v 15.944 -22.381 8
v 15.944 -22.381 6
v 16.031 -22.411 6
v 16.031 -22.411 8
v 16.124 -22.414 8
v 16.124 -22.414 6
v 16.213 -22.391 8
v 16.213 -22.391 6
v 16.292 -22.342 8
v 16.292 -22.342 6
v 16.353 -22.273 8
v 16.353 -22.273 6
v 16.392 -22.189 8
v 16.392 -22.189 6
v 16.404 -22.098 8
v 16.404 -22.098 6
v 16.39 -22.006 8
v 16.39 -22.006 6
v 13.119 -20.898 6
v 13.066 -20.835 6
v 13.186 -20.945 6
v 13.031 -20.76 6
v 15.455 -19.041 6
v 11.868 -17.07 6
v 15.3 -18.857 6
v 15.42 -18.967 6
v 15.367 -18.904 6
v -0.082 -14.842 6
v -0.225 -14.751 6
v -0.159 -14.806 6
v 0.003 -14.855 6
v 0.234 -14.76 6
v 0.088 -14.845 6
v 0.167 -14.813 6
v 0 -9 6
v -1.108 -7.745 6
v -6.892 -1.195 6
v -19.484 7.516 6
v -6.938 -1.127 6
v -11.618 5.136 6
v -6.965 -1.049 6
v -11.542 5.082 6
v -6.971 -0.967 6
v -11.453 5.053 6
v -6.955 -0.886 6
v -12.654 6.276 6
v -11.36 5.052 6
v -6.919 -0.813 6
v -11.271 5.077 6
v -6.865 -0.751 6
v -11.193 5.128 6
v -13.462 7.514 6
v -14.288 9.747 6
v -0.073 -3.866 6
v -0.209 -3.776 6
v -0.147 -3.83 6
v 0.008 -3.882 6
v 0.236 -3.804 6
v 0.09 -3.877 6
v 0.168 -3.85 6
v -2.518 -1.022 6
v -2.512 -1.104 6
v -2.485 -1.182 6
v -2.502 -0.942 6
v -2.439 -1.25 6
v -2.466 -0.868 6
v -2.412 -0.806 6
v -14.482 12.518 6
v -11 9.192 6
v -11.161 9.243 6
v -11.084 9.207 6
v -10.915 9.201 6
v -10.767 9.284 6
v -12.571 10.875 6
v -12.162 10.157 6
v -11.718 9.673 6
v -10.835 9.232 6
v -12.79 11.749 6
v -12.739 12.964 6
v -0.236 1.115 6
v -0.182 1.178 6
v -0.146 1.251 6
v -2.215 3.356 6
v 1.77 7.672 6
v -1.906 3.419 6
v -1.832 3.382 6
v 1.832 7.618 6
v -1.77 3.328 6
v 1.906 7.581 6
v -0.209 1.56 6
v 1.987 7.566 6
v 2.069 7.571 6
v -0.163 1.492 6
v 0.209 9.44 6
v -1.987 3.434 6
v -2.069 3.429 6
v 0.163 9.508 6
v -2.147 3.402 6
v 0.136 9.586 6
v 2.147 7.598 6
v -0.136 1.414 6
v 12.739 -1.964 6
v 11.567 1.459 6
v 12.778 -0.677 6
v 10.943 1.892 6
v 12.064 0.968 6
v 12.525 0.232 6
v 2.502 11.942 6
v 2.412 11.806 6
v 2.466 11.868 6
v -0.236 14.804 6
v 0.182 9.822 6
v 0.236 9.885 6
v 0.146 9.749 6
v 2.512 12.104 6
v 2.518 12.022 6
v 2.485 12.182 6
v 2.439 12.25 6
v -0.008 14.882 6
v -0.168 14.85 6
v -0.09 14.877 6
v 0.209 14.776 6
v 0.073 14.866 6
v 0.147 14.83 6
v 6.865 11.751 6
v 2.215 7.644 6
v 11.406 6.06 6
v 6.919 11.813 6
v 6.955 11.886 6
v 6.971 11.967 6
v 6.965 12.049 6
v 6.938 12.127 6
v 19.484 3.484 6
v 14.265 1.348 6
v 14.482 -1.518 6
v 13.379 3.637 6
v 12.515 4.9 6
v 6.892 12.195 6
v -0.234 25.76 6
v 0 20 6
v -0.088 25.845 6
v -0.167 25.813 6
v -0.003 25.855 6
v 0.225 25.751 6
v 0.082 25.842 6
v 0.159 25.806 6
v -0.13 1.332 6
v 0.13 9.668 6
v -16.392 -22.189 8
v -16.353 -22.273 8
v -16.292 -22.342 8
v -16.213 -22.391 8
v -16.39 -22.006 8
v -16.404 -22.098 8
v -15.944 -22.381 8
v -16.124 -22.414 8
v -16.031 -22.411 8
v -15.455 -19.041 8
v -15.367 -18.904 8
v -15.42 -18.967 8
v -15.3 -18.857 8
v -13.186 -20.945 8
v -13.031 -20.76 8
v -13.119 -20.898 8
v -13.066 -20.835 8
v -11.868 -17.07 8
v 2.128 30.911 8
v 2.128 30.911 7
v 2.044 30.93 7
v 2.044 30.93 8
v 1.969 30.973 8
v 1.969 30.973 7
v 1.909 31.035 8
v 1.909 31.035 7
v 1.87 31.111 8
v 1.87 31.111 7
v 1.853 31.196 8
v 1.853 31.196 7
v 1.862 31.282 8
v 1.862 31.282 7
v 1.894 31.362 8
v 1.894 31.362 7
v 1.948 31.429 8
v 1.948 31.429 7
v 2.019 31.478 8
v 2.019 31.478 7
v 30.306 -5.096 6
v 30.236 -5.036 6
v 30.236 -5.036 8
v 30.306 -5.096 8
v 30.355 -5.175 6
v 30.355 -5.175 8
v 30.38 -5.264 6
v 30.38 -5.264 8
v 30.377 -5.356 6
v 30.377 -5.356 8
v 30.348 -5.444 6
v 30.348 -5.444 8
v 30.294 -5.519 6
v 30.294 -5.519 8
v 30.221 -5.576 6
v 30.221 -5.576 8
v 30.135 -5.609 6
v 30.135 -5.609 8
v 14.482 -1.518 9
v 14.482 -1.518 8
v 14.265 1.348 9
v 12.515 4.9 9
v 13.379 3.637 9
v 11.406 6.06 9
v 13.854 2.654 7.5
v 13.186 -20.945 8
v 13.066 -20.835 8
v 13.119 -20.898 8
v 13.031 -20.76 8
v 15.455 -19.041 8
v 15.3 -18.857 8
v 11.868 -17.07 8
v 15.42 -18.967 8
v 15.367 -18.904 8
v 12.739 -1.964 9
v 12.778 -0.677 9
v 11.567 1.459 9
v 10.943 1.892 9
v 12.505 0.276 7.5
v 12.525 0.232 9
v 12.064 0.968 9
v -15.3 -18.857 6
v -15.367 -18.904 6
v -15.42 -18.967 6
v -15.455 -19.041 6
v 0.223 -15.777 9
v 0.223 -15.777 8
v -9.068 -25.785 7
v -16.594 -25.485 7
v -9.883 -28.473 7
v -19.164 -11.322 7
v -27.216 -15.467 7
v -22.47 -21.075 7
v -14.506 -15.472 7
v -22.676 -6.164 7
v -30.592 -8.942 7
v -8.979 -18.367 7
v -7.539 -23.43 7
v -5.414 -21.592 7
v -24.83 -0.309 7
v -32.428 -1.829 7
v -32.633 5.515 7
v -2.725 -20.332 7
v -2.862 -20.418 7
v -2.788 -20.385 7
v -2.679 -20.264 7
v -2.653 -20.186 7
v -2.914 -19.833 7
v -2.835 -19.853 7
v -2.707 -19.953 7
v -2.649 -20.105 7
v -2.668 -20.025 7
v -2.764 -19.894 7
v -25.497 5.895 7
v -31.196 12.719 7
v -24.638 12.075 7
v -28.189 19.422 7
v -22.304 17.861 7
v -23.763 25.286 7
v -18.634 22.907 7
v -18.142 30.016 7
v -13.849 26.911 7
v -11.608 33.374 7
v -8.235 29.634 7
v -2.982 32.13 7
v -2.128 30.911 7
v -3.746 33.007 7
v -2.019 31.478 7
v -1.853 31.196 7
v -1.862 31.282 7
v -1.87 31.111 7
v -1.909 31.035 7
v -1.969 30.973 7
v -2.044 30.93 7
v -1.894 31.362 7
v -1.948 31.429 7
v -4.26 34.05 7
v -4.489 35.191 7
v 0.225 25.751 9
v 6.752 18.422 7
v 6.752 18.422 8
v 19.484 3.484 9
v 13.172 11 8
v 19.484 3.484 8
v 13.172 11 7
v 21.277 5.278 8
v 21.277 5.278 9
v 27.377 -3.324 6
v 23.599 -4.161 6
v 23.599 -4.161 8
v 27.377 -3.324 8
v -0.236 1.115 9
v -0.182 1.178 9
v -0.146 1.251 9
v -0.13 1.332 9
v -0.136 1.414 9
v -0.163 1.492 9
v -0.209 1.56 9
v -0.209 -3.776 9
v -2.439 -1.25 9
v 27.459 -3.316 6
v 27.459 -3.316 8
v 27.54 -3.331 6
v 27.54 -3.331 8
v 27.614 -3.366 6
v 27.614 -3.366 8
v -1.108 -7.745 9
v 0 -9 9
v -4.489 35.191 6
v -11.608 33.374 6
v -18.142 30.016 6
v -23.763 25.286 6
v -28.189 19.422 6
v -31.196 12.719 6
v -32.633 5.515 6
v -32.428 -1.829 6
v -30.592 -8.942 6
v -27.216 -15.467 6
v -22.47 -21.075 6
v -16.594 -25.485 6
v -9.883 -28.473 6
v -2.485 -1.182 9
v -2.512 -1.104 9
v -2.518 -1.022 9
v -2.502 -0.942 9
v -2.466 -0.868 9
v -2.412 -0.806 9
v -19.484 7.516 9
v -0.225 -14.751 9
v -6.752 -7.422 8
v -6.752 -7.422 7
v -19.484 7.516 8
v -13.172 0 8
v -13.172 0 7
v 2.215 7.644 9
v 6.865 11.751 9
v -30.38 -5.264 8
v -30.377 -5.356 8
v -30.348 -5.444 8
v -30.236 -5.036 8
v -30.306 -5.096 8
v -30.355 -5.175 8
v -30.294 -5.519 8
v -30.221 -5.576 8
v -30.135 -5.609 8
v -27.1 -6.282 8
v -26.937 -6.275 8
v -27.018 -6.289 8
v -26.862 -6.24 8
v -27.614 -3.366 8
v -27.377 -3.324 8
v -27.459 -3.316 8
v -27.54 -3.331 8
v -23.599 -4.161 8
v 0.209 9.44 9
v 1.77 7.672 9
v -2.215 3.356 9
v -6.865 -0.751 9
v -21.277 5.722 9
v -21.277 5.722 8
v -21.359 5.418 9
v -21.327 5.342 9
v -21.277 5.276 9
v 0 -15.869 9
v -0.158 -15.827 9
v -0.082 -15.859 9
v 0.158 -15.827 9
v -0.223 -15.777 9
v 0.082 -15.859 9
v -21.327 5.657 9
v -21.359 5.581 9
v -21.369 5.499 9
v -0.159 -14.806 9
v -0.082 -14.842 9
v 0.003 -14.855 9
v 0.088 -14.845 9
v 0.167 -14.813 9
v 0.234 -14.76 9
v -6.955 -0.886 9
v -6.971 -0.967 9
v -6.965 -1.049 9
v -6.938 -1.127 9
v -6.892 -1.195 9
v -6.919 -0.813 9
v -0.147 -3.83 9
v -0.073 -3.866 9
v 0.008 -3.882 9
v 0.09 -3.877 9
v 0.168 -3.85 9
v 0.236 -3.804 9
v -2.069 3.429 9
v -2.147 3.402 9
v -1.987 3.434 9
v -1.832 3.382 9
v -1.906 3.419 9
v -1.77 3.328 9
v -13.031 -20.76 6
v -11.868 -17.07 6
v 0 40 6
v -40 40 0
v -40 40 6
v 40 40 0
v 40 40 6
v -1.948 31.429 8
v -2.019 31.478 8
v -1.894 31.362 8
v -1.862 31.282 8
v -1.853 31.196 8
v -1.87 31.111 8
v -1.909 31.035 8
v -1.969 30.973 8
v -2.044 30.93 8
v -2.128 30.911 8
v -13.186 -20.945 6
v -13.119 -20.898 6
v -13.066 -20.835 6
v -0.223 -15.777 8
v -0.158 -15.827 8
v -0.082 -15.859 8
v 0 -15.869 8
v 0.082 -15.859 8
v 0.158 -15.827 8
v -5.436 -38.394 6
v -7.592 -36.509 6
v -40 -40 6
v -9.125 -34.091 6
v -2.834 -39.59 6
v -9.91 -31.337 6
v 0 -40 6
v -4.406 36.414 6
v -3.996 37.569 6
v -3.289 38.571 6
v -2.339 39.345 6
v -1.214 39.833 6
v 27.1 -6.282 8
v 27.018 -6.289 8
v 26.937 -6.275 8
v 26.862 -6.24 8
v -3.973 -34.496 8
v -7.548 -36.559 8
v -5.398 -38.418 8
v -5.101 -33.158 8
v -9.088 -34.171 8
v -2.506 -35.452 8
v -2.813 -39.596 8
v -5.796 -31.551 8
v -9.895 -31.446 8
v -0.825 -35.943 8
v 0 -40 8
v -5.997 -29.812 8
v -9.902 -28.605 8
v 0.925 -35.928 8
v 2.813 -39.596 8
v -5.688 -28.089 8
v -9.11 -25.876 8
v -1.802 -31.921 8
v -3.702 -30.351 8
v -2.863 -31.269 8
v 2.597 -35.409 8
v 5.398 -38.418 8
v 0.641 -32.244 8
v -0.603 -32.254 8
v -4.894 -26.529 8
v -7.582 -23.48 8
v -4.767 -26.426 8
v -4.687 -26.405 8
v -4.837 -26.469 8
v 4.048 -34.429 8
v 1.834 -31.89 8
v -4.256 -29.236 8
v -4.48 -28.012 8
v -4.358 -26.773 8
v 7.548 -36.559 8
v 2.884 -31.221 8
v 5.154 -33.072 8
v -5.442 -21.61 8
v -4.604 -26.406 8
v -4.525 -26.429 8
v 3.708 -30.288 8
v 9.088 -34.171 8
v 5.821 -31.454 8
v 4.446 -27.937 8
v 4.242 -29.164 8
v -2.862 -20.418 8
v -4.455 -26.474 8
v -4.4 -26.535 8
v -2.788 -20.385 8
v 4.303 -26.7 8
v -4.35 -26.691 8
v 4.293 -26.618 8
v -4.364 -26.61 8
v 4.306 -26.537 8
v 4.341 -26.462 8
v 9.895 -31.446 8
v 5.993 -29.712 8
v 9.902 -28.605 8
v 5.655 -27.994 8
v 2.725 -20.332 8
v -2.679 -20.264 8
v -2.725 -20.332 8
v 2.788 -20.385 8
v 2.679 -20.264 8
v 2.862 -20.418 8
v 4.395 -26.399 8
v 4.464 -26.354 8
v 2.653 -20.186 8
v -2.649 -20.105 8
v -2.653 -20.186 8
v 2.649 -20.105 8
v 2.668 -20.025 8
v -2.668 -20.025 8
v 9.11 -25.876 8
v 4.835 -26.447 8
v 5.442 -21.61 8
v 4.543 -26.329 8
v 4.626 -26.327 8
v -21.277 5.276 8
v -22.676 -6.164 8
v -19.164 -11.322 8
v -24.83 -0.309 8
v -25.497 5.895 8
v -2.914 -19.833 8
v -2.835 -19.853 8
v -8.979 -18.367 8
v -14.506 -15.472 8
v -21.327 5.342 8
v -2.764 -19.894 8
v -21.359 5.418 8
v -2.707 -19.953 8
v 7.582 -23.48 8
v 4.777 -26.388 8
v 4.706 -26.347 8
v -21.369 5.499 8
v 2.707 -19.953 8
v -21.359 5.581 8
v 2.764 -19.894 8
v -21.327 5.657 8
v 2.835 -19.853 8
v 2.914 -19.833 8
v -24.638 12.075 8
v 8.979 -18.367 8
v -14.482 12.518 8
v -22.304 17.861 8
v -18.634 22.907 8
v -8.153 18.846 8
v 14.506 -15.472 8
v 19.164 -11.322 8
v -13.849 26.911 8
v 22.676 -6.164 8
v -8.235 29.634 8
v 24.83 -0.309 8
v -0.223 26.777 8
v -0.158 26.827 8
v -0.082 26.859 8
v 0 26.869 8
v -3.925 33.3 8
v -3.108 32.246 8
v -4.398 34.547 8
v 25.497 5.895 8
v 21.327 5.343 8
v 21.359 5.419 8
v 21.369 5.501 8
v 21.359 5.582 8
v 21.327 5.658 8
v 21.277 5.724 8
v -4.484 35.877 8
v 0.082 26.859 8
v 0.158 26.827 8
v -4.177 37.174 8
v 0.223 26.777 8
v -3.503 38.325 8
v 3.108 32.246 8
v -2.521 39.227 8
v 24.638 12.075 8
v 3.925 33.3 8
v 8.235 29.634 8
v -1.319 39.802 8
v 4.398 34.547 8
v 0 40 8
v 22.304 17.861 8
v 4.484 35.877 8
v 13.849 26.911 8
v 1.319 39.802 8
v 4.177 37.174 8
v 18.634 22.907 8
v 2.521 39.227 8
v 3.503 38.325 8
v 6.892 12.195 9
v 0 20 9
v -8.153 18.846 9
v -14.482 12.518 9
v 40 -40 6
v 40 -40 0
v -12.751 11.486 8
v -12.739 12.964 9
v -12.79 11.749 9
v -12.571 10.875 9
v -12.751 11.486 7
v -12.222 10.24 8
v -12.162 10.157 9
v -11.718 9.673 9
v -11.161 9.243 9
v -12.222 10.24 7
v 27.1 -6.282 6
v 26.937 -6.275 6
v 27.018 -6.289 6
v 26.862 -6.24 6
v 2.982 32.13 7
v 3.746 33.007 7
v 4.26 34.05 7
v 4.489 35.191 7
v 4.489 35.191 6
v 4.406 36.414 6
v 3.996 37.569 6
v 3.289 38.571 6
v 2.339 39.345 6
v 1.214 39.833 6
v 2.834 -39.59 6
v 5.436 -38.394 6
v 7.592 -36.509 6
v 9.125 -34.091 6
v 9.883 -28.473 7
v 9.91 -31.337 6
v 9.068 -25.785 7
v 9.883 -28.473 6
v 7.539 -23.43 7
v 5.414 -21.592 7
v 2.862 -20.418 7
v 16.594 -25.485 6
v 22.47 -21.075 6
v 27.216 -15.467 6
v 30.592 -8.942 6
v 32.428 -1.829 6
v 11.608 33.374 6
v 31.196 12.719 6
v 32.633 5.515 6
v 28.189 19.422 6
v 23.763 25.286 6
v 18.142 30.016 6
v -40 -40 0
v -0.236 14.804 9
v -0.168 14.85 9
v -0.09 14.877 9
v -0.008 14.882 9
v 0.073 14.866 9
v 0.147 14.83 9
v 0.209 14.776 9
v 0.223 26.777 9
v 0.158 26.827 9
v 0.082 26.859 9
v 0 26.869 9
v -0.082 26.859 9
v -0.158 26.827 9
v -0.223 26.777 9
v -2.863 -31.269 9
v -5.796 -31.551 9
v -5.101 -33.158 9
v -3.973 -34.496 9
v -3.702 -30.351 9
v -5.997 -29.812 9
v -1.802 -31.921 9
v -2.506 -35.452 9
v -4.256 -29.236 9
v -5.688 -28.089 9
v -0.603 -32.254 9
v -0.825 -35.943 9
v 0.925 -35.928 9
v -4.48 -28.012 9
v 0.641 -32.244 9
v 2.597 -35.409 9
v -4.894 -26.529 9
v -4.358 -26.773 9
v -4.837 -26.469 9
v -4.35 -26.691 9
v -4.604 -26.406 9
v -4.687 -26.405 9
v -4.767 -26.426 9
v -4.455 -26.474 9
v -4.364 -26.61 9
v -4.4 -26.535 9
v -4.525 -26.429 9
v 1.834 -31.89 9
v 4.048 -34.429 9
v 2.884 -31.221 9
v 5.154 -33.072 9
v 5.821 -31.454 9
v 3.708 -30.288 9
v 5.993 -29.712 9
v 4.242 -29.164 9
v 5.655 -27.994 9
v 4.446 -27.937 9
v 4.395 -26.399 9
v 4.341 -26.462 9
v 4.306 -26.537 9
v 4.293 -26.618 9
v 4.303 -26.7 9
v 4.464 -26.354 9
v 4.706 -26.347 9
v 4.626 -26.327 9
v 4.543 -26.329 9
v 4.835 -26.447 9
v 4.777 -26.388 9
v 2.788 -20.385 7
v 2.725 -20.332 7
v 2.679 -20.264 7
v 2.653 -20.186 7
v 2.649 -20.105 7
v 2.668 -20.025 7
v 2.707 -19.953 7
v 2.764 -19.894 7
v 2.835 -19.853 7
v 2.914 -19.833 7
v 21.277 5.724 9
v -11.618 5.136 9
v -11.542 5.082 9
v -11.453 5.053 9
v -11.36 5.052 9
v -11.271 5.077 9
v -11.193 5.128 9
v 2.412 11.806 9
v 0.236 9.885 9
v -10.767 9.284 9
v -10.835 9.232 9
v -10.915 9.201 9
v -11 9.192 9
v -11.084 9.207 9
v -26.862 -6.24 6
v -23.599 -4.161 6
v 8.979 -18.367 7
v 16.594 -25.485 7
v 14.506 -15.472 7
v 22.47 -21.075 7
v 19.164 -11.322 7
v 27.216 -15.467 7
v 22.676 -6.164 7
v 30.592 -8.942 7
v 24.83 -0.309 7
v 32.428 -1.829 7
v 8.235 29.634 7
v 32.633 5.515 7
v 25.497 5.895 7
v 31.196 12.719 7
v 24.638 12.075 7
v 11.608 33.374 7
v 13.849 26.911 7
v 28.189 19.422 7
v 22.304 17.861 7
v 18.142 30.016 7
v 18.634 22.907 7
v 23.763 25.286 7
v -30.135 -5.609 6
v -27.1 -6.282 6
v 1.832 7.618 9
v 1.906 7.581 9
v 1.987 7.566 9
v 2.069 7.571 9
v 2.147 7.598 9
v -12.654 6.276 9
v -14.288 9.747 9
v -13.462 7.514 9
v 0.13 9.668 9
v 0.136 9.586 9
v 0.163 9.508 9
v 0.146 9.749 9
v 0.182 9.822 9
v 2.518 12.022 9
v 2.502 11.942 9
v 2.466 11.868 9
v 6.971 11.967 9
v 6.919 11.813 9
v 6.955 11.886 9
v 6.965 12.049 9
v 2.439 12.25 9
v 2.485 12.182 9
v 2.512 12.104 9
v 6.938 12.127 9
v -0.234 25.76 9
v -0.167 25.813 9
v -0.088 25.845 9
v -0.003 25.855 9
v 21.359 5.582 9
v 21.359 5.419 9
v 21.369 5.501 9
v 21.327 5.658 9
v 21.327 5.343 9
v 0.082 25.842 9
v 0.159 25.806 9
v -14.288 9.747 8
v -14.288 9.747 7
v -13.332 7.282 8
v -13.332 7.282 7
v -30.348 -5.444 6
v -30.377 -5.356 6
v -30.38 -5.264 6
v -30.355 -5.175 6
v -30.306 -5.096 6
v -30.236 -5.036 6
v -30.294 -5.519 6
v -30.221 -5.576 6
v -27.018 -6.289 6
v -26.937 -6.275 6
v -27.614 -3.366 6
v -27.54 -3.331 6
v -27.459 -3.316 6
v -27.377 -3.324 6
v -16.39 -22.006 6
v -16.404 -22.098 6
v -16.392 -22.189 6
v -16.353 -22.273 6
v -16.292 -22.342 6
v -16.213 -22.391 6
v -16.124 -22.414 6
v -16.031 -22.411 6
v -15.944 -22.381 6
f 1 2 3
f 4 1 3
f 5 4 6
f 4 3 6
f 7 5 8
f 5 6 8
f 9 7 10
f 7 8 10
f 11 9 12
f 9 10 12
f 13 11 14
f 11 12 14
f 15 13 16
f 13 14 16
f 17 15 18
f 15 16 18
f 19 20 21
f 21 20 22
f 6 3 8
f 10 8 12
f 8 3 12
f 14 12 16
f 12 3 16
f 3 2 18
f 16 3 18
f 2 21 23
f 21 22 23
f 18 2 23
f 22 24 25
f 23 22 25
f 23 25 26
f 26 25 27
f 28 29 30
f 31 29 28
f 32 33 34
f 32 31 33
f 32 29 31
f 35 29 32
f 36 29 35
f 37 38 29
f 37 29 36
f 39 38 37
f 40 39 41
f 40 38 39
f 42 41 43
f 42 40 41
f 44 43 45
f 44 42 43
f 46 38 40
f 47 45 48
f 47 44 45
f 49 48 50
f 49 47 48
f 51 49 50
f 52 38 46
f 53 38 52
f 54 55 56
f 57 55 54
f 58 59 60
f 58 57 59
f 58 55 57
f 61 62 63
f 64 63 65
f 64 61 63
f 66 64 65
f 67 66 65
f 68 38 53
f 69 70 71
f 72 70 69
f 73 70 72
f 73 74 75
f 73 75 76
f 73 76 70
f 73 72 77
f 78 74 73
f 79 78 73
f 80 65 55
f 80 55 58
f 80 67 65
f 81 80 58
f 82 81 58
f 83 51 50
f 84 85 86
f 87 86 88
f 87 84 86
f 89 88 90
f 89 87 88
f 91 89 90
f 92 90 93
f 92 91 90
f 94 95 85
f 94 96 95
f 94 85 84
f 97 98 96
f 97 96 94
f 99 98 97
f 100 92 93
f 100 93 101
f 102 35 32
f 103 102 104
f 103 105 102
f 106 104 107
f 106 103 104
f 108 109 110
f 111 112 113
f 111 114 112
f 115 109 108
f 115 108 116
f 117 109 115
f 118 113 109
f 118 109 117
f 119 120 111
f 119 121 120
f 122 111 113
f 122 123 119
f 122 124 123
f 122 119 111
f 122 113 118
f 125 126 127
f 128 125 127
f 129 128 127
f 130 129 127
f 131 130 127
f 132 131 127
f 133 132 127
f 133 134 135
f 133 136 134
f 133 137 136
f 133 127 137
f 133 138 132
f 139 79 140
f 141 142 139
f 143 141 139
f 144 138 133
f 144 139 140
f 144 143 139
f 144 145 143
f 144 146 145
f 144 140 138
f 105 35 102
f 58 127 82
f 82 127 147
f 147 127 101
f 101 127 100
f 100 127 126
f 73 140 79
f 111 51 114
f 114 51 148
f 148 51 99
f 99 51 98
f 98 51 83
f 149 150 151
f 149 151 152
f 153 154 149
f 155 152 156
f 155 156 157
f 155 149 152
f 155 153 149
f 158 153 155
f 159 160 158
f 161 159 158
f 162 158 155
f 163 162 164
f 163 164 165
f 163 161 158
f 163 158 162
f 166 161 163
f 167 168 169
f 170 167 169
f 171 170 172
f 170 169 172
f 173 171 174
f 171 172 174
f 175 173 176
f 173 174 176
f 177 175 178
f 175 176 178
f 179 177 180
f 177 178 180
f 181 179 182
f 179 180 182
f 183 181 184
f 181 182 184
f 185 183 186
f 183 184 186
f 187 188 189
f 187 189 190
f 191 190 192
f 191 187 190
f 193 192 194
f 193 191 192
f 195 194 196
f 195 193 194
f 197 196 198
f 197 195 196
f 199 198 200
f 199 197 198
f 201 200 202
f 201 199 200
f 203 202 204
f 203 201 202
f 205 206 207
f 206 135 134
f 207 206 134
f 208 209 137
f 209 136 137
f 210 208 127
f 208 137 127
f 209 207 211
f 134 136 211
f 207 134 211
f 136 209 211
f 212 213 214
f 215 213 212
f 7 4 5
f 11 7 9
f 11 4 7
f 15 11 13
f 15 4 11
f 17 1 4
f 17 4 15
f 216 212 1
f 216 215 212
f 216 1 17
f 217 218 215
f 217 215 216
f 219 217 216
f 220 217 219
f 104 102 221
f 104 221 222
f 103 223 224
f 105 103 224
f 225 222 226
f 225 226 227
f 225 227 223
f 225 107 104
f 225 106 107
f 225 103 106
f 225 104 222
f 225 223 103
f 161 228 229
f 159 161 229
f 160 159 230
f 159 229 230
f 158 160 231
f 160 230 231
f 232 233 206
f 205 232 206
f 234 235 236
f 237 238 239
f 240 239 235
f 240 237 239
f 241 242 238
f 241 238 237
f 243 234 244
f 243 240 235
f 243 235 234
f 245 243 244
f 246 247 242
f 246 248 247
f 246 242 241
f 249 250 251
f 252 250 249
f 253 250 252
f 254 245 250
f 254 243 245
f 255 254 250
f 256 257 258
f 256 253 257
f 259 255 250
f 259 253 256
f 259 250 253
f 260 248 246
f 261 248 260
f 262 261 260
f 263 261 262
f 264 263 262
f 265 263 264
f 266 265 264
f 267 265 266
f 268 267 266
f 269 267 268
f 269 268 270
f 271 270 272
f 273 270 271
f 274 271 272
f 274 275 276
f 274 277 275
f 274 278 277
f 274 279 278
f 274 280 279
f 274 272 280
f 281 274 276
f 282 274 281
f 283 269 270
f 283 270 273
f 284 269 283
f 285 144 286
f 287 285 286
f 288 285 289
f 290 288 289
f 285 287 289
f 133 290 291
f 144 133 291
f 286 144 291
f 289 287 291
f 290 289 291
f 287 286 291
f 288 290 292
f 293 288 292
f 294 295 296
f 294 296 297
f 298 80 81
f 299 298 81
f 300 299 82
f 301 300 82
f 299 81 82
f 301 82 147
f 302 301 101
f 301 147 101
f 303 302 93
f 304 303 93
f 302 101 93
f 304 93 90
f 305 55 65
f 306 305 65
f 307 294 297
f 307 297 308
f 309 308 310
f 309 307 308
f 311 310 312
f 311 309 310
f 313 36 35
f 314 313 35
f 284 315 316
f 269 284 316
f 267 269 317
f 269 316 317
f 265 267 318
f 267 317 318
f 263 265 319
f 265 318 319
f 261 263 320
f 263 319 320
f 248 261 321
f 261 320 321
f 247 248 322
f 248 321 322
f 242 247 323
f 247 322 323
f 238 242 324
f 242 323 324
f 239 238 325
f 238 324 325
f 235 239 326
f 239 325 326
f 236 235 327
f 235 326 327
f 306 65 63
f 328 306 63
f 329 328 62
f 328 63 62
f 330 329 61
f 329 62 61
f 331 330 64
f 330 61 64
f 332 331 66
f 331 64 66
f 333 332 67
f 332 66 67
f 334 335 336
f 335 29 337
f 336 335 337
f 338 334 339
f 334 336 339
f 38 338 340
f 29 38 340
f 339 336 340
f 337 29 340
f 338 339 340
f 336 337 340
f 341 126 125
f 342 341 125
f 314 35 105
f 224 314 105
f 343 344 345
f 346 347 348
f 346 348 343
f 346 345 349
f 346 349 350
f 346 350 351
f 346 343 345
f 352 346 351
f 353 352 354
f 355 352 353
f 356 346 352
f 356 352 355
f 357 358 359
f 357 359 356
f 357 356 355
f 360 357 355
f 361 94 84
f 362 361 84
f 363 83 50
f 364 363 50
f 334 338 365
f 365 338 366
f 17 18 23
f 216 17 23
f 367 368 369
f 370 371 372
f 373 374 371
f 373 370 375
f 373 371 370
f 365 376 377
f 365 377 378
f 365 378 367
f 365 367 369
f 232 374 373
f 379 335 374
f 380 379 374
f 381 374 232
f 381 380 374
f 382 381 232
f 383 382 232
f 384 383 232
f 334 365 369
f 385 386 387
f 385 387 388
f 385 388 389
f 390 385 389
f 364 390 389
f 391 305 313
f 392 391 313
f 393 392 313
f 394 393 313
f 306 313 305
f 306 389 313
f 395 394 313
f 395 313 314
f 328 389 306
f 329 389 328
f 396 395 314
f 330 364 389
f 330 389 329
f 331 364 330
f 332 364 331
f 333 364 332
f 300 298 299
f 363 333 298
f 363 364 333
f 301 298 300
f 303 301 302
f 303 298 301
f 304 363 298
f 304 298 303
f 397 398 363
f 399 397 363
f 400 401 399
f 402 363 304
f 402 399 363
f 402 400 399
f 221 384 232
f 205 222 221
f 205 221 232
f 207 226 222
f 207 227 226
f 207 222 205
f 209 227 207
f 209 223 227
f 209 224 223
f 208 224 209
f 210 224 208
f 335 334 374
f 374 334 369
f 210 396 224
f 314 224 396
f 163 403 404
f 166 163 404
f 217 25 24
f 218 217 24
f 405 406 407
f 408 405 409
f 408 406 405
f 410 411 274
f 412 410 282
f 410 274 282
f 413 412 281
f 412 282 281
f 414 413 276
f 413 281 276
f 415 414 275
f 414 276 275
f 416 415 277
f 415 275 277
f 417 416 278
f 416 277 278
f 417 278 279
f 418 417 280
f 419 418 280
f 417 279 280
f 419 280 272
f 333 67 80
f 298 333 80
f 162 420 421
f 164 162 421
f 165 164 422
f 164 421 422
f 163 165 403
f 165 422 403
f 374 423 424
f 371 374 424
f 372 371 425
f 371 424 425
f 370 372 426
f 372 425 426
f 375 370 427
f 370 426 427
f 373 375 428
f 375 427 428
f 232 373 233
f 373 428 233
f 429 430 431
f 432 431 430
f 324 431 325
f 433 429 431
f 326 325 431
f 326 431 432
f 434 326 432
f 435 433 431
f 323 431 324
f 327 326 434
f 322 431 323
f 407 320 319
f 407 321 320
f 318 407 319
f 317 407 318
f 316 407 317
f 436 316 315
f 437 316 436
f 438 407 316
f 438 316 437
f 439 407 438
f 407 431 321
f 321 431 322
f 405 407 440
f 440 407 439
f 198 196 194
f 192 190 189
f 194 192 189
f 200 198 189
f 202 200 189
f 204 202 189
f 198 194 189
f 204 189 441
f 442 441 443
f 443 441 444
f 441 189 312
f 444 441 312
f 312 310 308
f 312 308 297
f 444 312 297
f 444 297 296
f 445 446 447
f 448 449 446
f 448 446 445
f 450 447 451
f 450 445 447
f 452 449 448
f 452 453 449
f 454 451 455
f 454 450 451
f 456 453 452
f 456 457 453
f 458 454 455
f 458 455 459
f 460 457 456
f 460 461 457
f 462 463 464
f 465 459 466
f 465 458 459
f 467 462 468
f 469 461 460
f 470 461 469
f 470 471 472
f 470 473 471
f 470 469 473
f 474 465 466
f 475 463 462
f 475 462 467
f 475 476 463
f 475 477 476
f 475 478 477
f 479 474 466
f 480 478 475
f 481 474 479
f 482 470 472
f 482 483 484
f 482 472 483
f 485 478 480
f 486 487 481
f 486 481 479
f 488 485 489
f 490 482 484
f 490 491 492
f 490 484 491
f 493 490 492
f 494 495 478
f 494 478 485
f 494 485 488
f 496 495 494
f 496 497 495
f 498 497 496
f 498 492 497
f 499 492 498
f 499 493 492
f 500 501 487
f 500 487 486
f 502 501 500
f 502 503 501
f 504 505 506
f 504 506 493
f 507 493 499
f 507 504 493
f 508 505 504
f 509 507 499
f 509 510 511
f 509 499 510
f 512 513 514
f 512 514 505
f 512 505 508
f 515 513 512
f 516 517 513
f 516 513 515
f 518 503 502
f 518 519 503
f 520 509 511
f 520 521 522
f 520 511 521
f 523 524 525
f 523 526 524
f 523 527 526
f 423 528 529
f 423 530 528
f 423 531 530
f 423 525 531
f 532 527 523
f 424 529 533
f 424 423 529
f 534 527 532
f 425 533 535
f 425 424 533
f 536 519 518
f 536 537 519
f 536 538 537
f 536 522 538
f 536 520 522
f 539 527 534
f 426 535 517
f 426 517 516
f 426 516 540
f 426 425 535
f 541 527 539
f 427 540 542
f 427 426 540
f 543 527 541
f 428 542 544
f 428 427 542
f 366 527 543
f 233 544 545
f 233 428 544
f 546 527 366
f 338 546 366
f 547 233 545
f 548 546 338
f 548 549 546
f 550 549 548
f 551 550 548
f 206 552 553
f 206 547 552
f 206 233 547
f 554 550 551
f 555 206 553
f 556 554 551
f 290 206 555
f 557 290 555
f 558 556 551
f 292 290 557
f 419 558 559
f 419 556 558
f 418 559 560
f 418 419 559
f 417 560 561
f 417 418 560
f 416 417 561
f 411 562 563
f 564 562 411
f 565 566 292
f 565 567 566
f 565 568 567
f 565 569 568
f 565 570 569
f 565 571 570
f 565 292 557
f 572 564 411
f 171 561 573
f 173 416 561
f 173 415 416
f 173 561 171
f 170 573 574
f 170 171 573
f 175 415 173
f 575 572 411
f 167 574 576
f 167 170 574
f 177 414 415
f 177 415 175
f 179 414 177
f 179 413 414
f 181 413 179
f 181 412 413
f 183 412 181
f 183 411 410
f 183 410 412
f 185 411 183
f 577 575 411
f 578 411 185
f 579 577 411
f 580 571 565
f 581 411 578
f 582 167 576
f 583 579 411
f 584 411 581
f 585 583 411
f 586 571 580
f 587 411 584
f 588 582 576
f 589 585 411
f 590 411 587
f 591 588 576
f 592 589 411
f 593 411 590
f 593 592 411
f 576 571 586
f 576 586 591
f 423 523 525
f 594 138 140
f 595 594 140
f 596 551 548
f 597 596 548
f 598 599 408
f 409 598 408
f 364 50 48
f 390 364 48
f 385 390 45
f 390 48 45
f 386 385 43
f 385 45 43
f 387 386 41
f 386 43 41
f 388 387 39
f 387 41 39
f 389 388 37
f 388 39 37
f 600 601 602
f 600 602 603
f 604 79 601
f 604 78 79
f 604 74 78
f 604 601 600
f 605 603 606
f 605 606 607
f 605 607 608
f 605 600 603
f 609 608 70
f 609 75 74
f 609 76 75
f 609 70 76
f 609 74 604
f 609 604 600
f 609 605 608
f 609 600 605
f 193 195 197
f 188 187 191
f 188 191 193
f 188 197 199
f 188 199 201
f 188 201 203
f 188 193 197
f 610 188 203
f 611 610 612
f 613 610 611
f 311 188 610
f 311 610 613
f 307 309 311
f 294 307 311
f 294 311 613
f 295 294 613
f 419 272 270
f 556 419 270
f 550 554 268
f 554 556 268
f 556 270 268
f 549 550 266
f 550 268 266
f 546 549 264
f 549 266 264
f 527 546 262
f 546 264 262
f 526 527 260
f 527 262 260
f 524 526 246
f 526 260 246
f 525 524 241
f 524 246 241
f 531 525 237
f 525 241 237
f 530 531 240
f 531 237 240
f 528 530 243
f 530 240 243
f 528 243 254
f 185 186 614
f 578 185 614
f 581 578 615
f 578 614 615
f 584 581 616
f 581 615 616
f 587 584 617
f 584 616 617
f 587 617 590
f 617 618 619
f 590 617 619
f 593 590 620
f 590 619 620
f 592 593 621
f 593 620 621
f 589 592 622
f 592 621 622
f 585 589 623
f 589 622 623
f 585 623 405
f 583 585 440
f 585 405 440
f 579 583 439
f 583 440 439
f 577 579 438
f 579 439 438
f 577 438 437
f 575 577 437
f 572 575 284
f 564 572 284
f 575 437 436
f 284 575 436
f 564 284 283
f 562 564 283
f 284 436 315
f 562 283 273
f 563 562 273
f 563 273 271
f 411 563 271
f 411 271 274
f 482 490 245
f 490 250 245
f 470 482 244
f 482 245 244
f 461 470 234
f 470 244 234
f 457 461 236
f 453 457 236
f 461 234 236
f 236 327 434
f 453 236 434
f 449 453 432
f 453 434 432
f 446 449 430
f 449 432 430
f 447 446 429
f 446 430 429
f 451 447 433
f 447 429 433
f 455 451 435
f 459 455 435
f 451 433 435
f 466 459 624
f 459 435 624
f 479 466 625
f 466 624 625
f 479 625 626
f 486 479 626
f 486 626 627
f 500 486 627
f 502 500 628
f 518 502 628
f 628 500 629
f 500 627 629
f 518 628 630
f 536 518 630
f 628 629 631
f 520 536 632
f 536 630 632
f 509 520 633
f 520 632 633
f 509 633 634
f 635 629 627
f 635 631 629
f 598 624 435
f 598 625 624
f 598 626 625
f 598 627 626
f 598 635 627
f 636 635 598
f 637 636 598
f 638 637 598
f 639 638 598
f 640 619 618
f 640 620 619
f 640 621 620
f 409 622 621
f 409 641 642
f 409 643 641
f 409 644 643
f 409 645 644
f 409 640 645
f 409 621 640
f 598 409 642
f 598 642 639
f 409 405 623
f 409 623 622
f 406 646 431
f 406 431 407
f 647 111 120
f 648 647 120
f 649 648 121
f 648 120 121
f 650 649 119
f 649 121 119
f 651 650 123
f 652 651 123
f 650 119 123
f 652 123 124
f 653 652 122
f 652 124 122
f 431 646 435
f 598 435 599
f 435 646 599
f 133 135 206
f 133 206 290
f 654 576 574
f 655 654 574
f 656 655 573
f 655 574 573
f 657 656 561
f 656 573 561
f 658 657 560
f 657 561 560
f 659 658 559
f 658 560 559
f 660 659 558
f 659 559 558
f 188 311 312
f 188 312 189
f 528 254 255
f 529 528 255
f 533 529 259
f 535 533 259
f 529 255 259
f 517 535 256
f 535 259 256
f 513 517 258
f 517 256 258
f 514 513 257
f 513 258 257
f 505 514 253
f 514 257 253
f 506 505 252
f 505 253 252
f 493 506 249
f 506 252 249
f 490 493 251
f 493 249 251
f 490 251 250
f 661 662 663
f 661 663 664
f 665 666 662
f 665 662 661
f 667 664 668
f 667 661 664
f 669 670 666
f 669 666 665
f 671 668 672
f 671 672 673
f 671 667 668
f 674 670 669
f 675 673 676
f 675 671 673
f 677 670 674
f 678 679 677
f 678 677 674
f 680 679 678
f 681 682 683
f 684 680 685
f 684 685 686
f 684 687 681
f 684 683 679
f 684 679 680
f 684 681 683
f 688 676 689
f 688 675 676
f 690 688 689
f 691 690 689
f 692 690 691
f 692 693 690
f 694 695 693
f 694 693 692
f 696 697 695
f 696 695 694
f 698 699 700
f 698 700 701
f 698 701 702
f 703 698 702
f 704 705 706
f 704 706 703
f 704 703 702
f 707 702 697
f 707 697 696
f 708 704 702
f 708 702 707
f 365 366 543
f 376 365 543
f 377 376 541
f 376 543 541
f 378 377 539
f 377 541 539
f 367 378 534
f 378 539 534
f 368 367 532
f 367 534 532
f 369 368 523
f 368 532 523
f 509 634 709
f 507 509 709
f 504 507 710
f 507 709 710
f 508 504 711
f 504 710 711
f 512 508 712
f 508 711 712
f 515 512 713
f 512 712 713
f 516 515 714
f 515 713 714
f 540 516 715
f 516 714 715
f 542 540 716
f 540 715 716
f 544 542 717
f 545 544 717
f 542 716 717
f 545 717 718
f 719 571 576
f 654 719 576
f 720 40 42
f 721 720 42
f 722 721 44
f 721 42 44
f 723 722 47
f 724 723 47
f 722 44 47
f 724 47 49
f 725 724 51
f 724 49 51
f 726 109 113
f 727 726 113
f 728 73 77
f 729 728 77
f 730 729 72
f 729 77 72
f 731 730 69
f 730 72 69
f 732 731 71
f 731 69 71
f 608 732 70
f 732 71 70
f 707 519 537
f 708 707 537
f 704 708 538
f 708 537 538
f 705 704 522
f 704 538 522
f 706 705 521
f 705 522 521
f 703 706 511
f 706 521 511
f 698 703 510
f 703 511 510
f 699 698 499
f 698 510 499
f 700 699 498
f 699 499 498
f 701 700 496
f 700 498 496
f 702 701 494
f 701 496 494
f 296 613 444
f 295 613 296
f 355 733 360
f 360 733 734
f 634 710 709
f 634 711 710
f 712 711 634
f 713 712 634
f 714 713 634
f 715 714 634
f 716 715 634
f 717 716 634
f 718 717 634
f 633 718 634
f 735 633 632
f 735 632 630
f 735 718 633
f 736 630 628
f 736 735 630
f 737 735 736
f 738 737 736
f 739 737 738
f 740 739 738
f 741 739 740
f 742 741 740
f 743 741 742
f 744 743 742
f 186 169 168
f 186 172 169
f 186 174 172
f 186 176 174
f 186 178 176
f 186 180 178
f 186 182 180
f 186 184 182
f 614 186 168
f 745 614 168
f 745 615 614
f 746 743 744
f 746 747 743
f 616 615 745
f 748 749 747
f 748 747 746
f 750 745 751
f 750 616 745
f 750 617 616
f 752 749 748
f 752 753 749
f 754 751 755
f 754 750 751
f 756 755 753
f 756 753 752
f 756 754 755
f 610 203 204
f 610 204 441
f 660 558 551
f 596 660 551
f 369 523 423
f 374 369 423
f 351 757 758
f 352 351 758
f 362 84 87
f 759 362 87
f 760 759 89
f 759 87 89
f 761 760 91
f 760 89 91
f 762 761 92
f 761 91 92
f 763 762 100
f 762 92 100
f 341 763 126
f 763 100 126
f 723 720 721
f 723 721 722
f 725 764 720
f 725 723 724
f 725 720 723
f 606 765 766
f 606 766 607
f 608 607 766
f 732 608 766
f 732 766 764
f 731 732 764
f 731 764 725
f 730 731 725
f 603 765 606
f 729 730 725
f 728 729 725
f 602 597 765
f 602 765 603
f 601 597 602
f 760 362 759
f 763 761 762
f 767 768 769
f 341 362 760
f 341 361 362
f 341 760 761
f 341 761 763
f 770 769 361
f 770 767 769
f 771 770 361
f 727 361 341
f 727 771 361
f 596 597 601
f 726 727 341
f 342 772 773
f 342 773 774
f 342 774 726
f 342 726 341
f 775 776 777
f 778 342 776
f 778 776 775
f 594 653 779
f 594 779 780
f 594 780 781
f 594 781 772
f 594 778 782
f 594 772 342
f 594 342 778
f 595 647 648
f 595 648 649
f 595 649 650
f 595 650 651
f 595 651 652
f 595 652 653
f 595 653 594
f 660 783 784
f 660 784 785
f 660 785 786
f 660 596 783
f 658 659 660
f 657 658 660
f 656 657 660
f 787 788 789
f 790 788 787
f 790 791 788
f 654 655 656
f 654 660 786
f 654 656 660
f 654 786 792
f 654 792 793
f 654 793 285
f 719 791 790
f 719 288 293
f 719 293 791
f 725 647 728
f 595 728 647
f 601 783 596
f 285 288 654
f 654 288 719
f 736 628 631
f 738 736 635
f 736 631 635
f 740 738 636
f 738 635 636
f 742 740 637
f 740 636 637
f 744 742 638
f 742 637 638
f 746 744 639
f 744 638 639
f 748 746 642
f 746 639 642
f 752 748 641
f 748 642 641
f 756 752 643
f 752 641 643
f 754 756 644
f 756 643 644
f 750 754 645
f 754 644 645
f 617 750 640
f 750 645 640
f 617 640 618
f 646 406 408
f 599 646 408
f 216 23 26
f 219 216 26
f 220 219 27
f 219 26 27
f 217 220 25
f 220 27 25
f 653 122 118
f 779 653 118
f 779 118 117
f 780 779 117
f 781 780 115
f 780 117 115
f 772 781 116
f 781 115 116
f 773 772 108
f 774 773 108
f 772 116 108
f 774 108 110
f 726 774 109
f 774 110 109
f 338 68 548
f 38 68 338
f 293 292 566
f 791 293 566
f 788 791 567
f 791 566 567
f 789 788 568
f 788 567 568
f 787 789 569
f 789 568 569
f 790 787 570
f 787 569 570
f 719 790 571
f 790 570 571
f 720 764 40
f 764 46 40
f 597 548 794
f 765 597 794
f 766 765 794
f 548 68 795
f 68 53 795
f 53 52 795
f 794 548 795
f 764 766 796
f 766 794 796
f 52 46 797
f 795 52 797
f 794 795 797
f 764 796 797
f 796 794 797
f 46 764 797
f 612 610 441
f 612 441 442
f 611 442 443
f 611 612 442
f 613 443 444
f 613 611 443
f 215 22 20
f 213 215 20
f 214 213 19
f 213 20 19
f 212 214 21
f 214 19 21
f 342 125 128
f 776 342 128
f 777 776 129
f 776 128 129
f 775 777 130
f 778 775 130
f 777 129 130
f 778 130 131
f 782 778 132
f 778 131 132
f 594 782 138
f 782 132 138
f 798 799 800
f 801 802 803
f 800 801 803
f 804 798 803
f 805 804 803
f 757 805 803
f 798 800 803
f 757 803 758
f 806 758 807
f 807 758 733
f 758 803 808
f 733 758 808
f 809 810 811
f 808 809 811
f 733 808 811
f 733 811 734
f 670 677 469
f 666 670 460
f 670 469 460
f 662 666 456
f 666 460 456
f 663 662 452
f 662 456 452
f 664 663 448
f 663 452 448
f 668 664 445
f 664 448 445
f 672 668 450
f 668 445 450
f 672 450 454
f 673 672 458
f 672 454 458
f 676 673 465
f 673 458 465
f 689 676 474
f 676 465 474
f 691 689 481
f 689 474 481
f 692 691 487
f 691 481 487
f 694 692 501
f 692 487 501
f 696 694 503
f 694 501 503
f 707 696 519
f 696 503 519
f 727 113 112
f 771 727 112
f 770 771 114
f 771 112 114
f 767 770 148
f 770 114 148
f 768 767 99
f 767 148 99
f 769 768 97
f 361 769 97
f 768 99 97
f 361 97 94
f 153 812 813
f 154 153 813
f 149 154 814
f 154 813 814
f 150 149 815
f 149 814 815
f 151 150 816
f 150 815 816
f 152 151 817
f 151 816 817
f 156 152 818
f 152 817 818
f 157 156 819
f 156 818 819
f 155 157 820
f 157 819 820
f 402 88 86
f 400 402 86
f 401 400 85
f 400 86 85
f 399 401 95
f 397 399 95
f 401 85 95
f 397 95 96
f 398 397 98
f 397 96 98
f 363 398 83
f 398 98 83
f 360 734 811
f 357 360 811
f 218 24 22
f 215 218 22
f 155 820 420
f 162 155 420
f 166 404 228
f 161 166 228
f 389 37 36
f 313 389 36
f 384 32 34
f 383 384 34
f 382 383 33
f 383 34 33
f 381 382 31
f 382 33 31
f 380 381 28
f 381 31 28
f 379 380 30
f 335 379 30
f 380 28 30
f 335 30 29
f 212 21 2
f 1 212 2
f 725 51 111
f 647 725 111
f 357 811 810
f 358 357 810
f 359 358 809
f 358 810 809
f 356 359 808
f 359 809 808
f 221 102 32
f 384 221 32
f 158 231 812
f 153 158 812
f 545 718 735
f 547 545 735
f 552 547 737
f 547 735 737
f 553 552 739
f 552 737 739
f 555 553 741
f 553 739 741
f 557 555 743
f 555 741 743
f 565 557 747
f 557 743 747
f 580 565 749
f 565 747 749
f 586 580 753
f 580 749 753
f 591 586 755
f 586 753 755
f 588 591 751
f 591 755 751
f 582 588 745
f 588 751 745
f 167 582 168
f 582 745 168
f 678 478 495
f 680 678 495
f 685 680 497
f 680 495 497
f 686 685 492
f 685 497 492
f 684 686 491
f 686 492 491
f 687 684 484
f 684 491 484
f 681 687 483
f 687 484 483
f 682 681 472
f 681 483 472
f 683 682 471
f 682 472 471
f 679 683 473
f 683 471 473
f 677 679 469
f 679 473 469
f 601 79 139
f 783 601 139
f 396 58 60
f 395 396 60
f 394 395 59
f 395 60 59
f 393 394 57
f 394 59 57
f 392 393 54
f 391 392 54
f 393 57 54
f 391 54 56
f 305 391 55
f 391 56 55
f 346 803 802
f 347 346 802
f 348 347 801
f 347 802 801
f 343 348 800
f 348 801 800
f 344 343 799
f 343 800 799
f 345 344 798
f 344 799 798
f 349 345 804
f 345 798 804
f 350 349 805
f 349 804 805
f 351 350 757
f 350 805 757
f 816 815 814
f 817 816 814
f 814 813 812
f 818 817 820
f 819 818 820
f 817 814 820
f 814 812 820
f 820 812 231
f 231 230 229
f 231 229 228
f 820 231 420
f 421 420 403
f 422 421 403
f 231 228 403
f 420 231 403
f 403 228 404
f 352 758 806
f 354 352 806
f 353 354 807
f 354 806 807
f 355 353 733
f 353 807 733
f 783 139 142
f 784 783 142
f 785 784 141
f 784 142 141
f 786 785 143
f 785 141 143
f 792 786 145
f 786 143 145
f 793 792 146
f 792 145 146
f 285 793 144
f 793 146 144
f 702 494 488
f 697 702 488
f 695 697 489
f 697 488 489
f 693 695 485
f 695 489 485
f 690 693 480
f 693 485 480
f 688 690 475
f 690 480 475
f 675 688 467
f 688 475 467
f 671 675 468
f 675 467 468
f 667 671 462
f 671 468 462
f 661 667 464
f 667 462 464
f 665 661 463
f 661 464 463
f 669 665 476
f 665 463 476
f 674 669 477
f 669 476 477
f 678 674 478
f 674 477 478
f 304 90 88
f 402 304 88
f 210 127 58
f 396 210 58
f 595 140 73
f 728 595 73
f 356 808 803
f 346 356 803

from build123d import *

# Parameters (mm, degrees)
SKETCH_1_W         = 80
SKETCH_1_H         = 80
EXTRUDE_1_DEPTH    = 6
SKETCH_4_R         = 25.5
EXTRUDE_28_DEPTH   = 2
SKETCH_4_14_R      = 4.5
EXTRUDE_36_DEPTH   = 2
SKETCH_4_14_R_2    = 10
EXTRUDE_36_2_DEPTH = 2
EXTRUDE_36_3_DEPTH = 2
EXTRUDE_36_4_DEPTH = 2
EXTRUDE_36_5_DEPTH = 2
EXTRUDE_36_6_DEPTH = 2
EXTRUDE_37_DEPTH   = 3
EXTRUDE_39_DEPTH   = 3
SKETCH_5_R         = 32.75
SKETCH_5_R_2       = 25.5
EXTRUDE_46_DEPTH   = 1
EXTRUDE_49_DEPTH   = 1
EXTRUDE_52_DEPTH   = 2
EXTRUDE_53_DEPTH   = 2
EXTRUDE_54_DEPTH   = 2
EXTRUDE_START      = 1
EXTRUDE_55_DEPTH   = 2


# Read off the part's stored shape, not the designer's step: 凸台-拉伸55
with BuildPart() as part:
    # 草图1 → 凸台-拉伸1 (new body)
    with BuildSketch(Plane.XY):
        Rectangle(SKETCH_1_W, SKETCH_1_H)
    extrude(amount=EXTRUDE_1_DEPTH)

    # 草图4 → 凸台-拉伸28 (add)
    with BuildSketch(Plane.XY.offset(6)):
        with Locations(Location((0, 5.5, 0), (0, 0, 180))):
            Circle(SKETCH_4_R)
        with BuildLine():
            Line((-0.222804873, 26.777187739), (-21.277195127, 5.722099318))
            ThreePointArc((-21.277195127, 5.722099318), (-21.369481763, 5.499289221), (-21.277187739, 5.276482184))
            Line((-21.277187739, 5.276482184), (-0.222812284, -15.777195127))
            ThreePointArc((-0.222812284, -15.777195127), (-2.188e-06, -15.869481763), (0.222804849, -15.777187739))
            Line((0.222804849, -15.777187739), (21.277195104, 5.277900682))
            ThreePointArc((21.277195104, 5.277900682), (21.36948174, 5.500710779), (21.277187716, 5.723517816))
            Line((21.277187716, 5.723517816), (0.222812261, 26.777195127))
            ThreePointArc((0.222812261, 26.777195127), (2.164e-06, 26.869481763), (-0.222804873, 26.777187739))
        make_face(mode=Mode.SUBTRACT)
    extrude(amount=EXTRUDE_28_DEPTH)

    # 草图4<15> → 凸台-拉伸37 (add)
    with BuildSketch(Plane.XY.offset(6)):
        with BuildLine():
            ThreePointArc((0.222812261, 26.777195127), (2.164e-06, 26.869481763), (-0.222804873, 26.777187739))
            Line((-0.222804873, 26.777187739), (-8.153398461, 18.846331171))
            Line((-8.153398461, 18.846331171), (-14.481547304, 12.517972485))
            add(Edge.make_bspline(
                [(-14.481547304, 12.517972485), (-14.671281268, 9.597285815), (-13.708804563, 7.118218354), (-11.618030464, 5.135565229)],
                knots=[0, 0, 0, 0, 0.967858294, 0.967858294, 0.967858294, 0.967858294], degree=3))
            ThreePointArc((-11.618030464, 5.135565229), (-11.406797411, 5.04915788), (-11.19263442, 5.128023881))
            Line((-11.19263442, 5.128023881), (-0.236183394, 14.803864956))
            ThreePointArc((-0.236183394, 14.803864956), (-0.008085477, 14.882175253), (0.208577849, 14.776259411))
            Line((0.208577849, 14.776259411), (2.439198466, 12.250413301))
            ThreePointArc((2.439198466, 12.250413301), (2.517508763, 12.022315384), (2.411592921, 11.805652058))
            Line((2.411592921, 11.805652058), (0.236183394, 9.884508358))
            ThreePointArc((0.236183394, 9.884508358), (0.130267552, 9.667845033), (0.208577849, 9.439747115))
            Line((0.208577849, 9.439747115), (1.77007899, 7.6715793))
            ThreePointArc((1.77007899, 7.6715793), (1.986742316, 7.565663458), (2.214840233, 7.643973755))
            Line((2.214840233, 7.643973755), (6.864887702, 11.750515207))
            ThreePointArc((6.864887702, 11.750515207), (6.970803544, 11.967178533), (6.892493247, 12.19527645))
            Line((6.892493247, 12.19527645), (0, 20))
            Line((0, 20), (-10.766760888, 9.283653907))
            ThreePointArc((-10.766760888, 9.283653907), (-10.956958862, 9.193523834), (-11.161473038, 9.243249591))
            add(Edge.make_bspline(
                [(-12.739199431, 12.964077031), (-13.023767051, 11.375785015), (-12.485025039, 10.108572994), (-11.161473038, 9.243249591)],
                knots=[0, 0, 0, 0, 0.949413484, 0.949413484, 0.949413484, 0.949413484], degree=3))
            Line((-12.739199431, 12.964077031), (-0.234282021, 25.760261044))
            ThreePointArc((-0.234282021, 25.760261044), (-0.002772606, 25.855070903), (0.224859664, 25.75129678))
            add(Edge.make_bspline(
                [(0.224859664, 25.75129678), (6.805789025, 18.468917619), (13.225459434, 11.046572642), (19.483752214, 3.484398322)],
                knots=[0.011258093, 0.011258093, 0.011258093, 0.011258093, 1, 1, 1, 1], degree=3))
            Line((19.483752214, 3.484398322), (21.277195104, 5.277900682))
            ThreePointArc((21.277195104, 5.277900682), (21.36948174, 5.500710779), (21.277187716, 5.723517816))
            Line((21.277187716, 5.723517816), (0.222812261, 26.777195127))
        make_face()
    extrude(amount=EXTRUDE_37_DEPTH)

    # 草图4<17> → 凸台-拉伸39 (add)
    with BuildSketch(Plane.XY.offset(6)):
        with BuildLine():
            add(Edge.make_bspline(
                [(-0.224859664, -14.75129678), (-6.805789024, -7.468917618), (-13.225459435, -0.046572643), (-19.483752214, 7.515601678)],
                knots=[0.011258093, 0.011258093, 0.011258093, 0.011258093, 1, 1, 1, 1], degree=3))
            Line((-19.483752226, 7.51560169), (-21.277195127, 5.722099318))
            ThreePointArc((-21.277195127, 5.722099318), (-21.369481763, 5.499289221), (-21.277187739, 5.276482184))
            Line((-21.277187739, 5.276482184), (-0.222812284, -15.777195127))
            ThreePointArc((-0.222812284, -15.777195127), (-2.188e-06, -15.869481763), (0.222804849, -15.777187739))
            Line((0.222804849, -15.777187739), (14.481547292, -1.517972474))
            add(Edge.make_bspline(
                [(14.481547304, -1.517972485), (14.763245886, 3.03685501), (11.405972883, 6.060379194)],
                knots=[0, 0, 0, 1, 1, 1], degree=2))
            Line((11.405972883, 6.060379194), (0.236183394, -3.803864956))
            ThreePointArc((0.236183394, -3.803864956), (0.008085477, -3.882175253), (-0.208577849, -3.776259411))
            Line((-0.208577849, -3.776259411), (-2.439198466, -1.250413301))
            ThreePointArc((-2.439198466, -1.250413301), (-2.517508763, -1.022315384), (-2.411592921, -0.805652058))
            Line((-2.411592921, -0.805652058), (-0.236183394, 1.115491642))
            ThreePointArc((-0.236183394, 1.115491642), (-0.130267552, 1.332154968), (-0.208577849, 1.560252885))
            Line((-0.208577849, 1.560252885), (-1.77007899, 3.3284207))
            ThreePointArc((-1.77007899, 3.3284207), (-1.986742316, 3.434336542), (-2.214840233, 3.356026245))
            Line((-2.214840233, 3.356026245), (-6.864887702, -0.750515207))
            ThreePointArc((-6.864887702, -0.750515207), (-6.970803544, -0.967178533), (-6.892493247, -1.19527645))
            Line((-6.892493247, -1.19527645), (-1.107936626, -7.745426543))
            Line((-1.107936626, -7.745426543), (0, -9))
            Line((0, -9), (10.943115677, 1.89187511))
            add(Edge.make_bspline(
                [(12.739199431, -1.964077031), (13.168518811, 0.587858851), (10.943115677, 1.89187511)],
                knots=[0, 0, 0, 1, 1, 1], degree=2))
            Line((12.739199431, -1.964077031), (0.234282021, -14.760261044))
            ThreePointArc((0.234282021, -14.760261044), (0.002772606, -14.855070903), (-0.224859664, -14.75129678))
        make_face()
    extrude(amount=EXTRUDE_39_DEPTH)



with BuildPart() as body_2:
    # 草图4<14> → 凸台-拉伸36 (new body)
    with BuildSketch(Plane.XY.offset(6)):
        with Locations((0, 35.5)):
            Circle(SKETCH_4_14_R)
    extrude(amount=EXTRUDE_36_DEPTH)


with BuildPart() as body_3:
    # 草图4<14> → Extrude 36 2 (new body)
    with BuildSketch(Plane.XY.offset(6)):
        with Locations((0, -30)):
            Circle(SKETCH_4_14_R_2)
        with BuildLine():
            ThreePointArc((4.302924706, -26.700427821), (0.019273318, -32.292349048), (-4.357795927, -26.773244316))
            ThreePointArc((-4.357795927, -26.773244316), (-4.524932498, -26.429464628), (-4.894026947, -26.528905038))
            ThreePointArc((-4.894026947, -26.528905038), (0.050444246, -35.999787944), (4.834971562, -26.447106814))
            ThreePointArc((4.834971562, -26.447106814), (4.464257285, -26.353886473), (4.302924706, -26.700427821))
        make_face(mode=Mode.SUBTRACT)
    extrude(amount=EXTRUDE_36_2_DEPTH)


with BuildPart() as body_4:
    # 草图4<14> → Extrude 36 3 (new body)
    with BuildSketch(Plane.XY.offset(6)):
        with BuildLine():
            Line((-23.598991401, -4.161138901), (-27.376750996, -3.323629762))
            ThreePointArc((-27.376750996, -3.323629762), (-27.499667229, -3.320947721), (-27.614253393, -3.365507843))
            Line((-27.614253393, -3.365507843), (-30.23615982, -5.035846454))
            ThreePointArc((-30.23615982, -5.035846454), (-30.377169143, -5.356314517), (-30.13505719, -5.609227963))
            Line((-30.13505719, -5.609227963), (-27.099981617, -6.282088018))
            ThreePointArc((-27.099981617, -6.282088018), (-26.977065384, -6.28477006), (-26.86247922, -6.240209937))
            Line((-26.86247922, -6.240209937), (-23.598991401, -4.161138901))
        make_face()
    extrude(amount=EXTRUDE_36_3_DEPTH)


with BuildPart() as body_5:
    # 草图4<14> → Extrude 36 4 (new body)
    with BuildSketch(Plane.XY.offset(6)):
        with BuildLine():
            Line((-11.867815844, -17.070001043), (-15.300088087, -18.856728881))
            ThreePointArc((-15.300088087, -18.856728881), (-15.395971368, -18.93368335), (-15.455106768, -19.041472951))
            Line((-15.455106768, -19.041472951), (-16.389930653, -22.006355526))
            ThreePointArc((-16.389930653, -22.006355526), (-16.291957161, -22.342487351), (-15.943919015, -22.380603727))
            Line((-15.943919015, -22.380603727), (-13.186410132, -20.945135461))
            ThreePointArc((-13.186410132, -20.945135461), (-13.090526852, -20.868180992), (-13.031391452, -20.760391391))
            Line((-13.031391452, -20.760391391), (-11.867815844, -17.070001043))
        make_face()
    extrude(amount=EXTRUDE_36_4_DEPTH)


with BuildPart() as body_6:
    # 草图4<14> → Extrude 36 5 (new body)
    with BuildSketch(Plane.XY.offset(6)):
        with BuildLine():
            Line((27.614253393, -3.365507843), (30.23615982, -5.035846454))
            ThreePointArc((30.23615982, -5.035846454), (30.377169143, -5.356314517), (30.13505719, -5.609227963))
            Line((30.13505719, -5.609227963), (27.099981617, -6.282088018))
            ThreePointArc((27.099981617, -6.282088018), (26.977065384, -6.28477006), (26.86247922, -6.240209937))
            Line((26.86247922, -6.240209937), (23.598991401, -4.161138901))
            Line((23.598991401, -4.161138901), (27.376750996, -3.323629762))
            ThreePointArc((27.376750996, -3.323629762), (27.499667229, -3.320947721), (27.614253393, -3.365507843))
        make_face()
    extrude(amount=EXTRUDE_36_5_DEPTH)


with BuildPart() as body_7:
    # 草图4<14> → Extrude 36 6 (new body)
    with BuildSketch(Plane.XY.offset(6)):
        with BuildLine():
            Line((13.186410132, -20.945135461), (15.943919015, -22.380603727))
            ThreePointArc((15.943919015, -22.380603727), (16.291957161, -22.342487351), (16.389930653, -22.006355526))
            Line((16.389930653, -22.006355526), (15.455106768, -19.041472951))
            ThreePointArc((15.455106768, -19.041472951), (15.395971368, -18.93368335), (15.300088087, -18.856728881))
            Line((15.300088087, -18.856728881), (11.867815844, -17.070001043))
            Line((11.867815844, -17.070001043), (13.031391452, -20.760391391))
            ThreePointArc((13.031391452, -20.760391391), (13.090526852, -20.868180992), (13.186410132, -20.945135461))
        make_face()
    extrude(amount=EXTRUDE_36_6_DEPTH)


with BuildPart() as body_8:
    # 草图5 → 凸台-拉伸46 (new body)
    with BuildSketch(Plane.XY.offset(6)):
        with Locations((0, 2.75)):
            Circle(SKETCH_5_R)
        with Locations((0, 5.5)):
            Circle(SKETCH_5_R_2, mode=Mode.SUBTRACT)
    extrude(amount=EXTRUDE_46_DEPTH)


with BuildPart() as body_9:
    # 草图4<22> → 凸台-拉伸49 (new body)
    with BuildSketch(Plane.XY.offset(6)):
        with BuildLine():
            ThreePointArc((4.302924706, -26.700427821), (0.019273318, -32.292349048), (-4.357795927, -26.773244316))
            ThreePointArc((-4.357795927, -26.773244316), (-4.524932498, -26.429464628), (-4.894026947, -26.528905038))
            ThreePointArc((-4.894026947, -26.528905038), (0.050444246, -35.999787944), (4.834971562, -26.447106814))
            ThreePointArc((4.834971562, -26.447106814), (4.464257285, -26.353886473), (4.302924706, -26.700427821))
        make_face()
    extrude(amount=EXTRUDE_49_DEPTH)


with BuildPart() as part_1:
    add(part.part)

    add(body_2.part)  # 凸台-拉伸52 merges body 2

    add(body_8.part)  # 凸台-拉伸52 merges body 8
    # 草图4<24> → 凸台-拉伸52 (add)
    with BuildSketch(Plane.XY.offset(6)):
        with BuildLine():
            ThreePointArc((2.018544397, 31.478125), (1.037198751, 31.121162397), (0, 31))
            ThreePointArc((0, 31), (1.064968064, 30.977751922), (2.128077814, 30.911046512))
            ThreePointArc((2.128077814, 30.911046512), (1.858558412, 31.153105437), (2.018544397, 31.478125))
        make_face()
    extrude(amount=EXTRUDE_52_DEPTH)

    # 草图4<25> → 凸台-拉伸53 (add)
    with BuildSketch(Plane.XY.offset(6)):
        with BuildLine():
            ThreePointArc((-2.018544397, 31.478125), (-1.858558412, 31.153105437), (-2.128077814, 30.911046512))
            ThreePointArc((-2.128077814, 30.911046512), (-1.064968064, 30.977751922), (0, 31))
            ThreePointArc((0, 31), (-1.037198751, 31.121162397), (-2.018544397, 31.478125))
        make_face()
    extrude(amount=EXTRUDE_53_DEPTH)


    add(body_3.part)  # 凸台-拉伸54 merges body 3
    # 草图4<26> → 凸台-拉伸54 (add)
    with BuildSketch(Plane.XY.offset(6)):
        with BuildLine():
            ThreePointArc((2.6e-08, -20), (-1.459408174, -19.958203546), (-2.914032211, -19.832951196))
            ThreePointArc((-2.914032211, -19.832951196), (-2.649472878, -20.104653041), (-2.862441692, -20.418432928))
            ThreePointArc((-2.862441692, -20.418432928), (-1.446431678, -20.105161174), (2.6e-08, -20))
        make_face()
        with BuildLine():
            ThreePointArc((2.914032211, -19.832951196), (1.4594082, -19.958203544), (2.6e-08, -20))
            ThreePointArc((2.6e-08, -20), (1.446431705, -20.105161177), (2.862441692, -20.418432928))
            ThreePointArc((2.862441692, -20.418432928), (2.649472878, -20.104653041), (2.914032211, -19.832951196))
        make_face()
    extrude(amount=EXTRUDE_54_DEPTH)


    add(body_9.part)  # 凸台-拉伸55 merges body 9
    # 凸台-拉伸55 outline → 凸台-拉伸55 (add)
    with BuildSketch(Plane.XY.offset(6).offset(EXTRUDE_START)):
        with BuildLine():
            ThreePointArc((4.834971562, -26.447106814), (4.464257285, -26.353886473), (4.302924706, -26.700427821))
            ThreePointArc((4.302924706, -26.700427821), (0.019273318, -32.292349048), (-4.357795927, -26.773244316))
            ThreePointArc((-4.357795927, -26.773244316), (-4.524932498, -26.429464628), (-4.894026947, -26.528905038))
            ThreePointArc((-4.894026947, -26.528905038), (0.050444247, -35.999787944), (4.834971562, -26.447106814))
        make_face()
    extrude(amount=EXTRUDE_55_DEPTH)


solid = Compound([body_4.part, body_5.part, body_6.part, body_7.part, part_1.part])
